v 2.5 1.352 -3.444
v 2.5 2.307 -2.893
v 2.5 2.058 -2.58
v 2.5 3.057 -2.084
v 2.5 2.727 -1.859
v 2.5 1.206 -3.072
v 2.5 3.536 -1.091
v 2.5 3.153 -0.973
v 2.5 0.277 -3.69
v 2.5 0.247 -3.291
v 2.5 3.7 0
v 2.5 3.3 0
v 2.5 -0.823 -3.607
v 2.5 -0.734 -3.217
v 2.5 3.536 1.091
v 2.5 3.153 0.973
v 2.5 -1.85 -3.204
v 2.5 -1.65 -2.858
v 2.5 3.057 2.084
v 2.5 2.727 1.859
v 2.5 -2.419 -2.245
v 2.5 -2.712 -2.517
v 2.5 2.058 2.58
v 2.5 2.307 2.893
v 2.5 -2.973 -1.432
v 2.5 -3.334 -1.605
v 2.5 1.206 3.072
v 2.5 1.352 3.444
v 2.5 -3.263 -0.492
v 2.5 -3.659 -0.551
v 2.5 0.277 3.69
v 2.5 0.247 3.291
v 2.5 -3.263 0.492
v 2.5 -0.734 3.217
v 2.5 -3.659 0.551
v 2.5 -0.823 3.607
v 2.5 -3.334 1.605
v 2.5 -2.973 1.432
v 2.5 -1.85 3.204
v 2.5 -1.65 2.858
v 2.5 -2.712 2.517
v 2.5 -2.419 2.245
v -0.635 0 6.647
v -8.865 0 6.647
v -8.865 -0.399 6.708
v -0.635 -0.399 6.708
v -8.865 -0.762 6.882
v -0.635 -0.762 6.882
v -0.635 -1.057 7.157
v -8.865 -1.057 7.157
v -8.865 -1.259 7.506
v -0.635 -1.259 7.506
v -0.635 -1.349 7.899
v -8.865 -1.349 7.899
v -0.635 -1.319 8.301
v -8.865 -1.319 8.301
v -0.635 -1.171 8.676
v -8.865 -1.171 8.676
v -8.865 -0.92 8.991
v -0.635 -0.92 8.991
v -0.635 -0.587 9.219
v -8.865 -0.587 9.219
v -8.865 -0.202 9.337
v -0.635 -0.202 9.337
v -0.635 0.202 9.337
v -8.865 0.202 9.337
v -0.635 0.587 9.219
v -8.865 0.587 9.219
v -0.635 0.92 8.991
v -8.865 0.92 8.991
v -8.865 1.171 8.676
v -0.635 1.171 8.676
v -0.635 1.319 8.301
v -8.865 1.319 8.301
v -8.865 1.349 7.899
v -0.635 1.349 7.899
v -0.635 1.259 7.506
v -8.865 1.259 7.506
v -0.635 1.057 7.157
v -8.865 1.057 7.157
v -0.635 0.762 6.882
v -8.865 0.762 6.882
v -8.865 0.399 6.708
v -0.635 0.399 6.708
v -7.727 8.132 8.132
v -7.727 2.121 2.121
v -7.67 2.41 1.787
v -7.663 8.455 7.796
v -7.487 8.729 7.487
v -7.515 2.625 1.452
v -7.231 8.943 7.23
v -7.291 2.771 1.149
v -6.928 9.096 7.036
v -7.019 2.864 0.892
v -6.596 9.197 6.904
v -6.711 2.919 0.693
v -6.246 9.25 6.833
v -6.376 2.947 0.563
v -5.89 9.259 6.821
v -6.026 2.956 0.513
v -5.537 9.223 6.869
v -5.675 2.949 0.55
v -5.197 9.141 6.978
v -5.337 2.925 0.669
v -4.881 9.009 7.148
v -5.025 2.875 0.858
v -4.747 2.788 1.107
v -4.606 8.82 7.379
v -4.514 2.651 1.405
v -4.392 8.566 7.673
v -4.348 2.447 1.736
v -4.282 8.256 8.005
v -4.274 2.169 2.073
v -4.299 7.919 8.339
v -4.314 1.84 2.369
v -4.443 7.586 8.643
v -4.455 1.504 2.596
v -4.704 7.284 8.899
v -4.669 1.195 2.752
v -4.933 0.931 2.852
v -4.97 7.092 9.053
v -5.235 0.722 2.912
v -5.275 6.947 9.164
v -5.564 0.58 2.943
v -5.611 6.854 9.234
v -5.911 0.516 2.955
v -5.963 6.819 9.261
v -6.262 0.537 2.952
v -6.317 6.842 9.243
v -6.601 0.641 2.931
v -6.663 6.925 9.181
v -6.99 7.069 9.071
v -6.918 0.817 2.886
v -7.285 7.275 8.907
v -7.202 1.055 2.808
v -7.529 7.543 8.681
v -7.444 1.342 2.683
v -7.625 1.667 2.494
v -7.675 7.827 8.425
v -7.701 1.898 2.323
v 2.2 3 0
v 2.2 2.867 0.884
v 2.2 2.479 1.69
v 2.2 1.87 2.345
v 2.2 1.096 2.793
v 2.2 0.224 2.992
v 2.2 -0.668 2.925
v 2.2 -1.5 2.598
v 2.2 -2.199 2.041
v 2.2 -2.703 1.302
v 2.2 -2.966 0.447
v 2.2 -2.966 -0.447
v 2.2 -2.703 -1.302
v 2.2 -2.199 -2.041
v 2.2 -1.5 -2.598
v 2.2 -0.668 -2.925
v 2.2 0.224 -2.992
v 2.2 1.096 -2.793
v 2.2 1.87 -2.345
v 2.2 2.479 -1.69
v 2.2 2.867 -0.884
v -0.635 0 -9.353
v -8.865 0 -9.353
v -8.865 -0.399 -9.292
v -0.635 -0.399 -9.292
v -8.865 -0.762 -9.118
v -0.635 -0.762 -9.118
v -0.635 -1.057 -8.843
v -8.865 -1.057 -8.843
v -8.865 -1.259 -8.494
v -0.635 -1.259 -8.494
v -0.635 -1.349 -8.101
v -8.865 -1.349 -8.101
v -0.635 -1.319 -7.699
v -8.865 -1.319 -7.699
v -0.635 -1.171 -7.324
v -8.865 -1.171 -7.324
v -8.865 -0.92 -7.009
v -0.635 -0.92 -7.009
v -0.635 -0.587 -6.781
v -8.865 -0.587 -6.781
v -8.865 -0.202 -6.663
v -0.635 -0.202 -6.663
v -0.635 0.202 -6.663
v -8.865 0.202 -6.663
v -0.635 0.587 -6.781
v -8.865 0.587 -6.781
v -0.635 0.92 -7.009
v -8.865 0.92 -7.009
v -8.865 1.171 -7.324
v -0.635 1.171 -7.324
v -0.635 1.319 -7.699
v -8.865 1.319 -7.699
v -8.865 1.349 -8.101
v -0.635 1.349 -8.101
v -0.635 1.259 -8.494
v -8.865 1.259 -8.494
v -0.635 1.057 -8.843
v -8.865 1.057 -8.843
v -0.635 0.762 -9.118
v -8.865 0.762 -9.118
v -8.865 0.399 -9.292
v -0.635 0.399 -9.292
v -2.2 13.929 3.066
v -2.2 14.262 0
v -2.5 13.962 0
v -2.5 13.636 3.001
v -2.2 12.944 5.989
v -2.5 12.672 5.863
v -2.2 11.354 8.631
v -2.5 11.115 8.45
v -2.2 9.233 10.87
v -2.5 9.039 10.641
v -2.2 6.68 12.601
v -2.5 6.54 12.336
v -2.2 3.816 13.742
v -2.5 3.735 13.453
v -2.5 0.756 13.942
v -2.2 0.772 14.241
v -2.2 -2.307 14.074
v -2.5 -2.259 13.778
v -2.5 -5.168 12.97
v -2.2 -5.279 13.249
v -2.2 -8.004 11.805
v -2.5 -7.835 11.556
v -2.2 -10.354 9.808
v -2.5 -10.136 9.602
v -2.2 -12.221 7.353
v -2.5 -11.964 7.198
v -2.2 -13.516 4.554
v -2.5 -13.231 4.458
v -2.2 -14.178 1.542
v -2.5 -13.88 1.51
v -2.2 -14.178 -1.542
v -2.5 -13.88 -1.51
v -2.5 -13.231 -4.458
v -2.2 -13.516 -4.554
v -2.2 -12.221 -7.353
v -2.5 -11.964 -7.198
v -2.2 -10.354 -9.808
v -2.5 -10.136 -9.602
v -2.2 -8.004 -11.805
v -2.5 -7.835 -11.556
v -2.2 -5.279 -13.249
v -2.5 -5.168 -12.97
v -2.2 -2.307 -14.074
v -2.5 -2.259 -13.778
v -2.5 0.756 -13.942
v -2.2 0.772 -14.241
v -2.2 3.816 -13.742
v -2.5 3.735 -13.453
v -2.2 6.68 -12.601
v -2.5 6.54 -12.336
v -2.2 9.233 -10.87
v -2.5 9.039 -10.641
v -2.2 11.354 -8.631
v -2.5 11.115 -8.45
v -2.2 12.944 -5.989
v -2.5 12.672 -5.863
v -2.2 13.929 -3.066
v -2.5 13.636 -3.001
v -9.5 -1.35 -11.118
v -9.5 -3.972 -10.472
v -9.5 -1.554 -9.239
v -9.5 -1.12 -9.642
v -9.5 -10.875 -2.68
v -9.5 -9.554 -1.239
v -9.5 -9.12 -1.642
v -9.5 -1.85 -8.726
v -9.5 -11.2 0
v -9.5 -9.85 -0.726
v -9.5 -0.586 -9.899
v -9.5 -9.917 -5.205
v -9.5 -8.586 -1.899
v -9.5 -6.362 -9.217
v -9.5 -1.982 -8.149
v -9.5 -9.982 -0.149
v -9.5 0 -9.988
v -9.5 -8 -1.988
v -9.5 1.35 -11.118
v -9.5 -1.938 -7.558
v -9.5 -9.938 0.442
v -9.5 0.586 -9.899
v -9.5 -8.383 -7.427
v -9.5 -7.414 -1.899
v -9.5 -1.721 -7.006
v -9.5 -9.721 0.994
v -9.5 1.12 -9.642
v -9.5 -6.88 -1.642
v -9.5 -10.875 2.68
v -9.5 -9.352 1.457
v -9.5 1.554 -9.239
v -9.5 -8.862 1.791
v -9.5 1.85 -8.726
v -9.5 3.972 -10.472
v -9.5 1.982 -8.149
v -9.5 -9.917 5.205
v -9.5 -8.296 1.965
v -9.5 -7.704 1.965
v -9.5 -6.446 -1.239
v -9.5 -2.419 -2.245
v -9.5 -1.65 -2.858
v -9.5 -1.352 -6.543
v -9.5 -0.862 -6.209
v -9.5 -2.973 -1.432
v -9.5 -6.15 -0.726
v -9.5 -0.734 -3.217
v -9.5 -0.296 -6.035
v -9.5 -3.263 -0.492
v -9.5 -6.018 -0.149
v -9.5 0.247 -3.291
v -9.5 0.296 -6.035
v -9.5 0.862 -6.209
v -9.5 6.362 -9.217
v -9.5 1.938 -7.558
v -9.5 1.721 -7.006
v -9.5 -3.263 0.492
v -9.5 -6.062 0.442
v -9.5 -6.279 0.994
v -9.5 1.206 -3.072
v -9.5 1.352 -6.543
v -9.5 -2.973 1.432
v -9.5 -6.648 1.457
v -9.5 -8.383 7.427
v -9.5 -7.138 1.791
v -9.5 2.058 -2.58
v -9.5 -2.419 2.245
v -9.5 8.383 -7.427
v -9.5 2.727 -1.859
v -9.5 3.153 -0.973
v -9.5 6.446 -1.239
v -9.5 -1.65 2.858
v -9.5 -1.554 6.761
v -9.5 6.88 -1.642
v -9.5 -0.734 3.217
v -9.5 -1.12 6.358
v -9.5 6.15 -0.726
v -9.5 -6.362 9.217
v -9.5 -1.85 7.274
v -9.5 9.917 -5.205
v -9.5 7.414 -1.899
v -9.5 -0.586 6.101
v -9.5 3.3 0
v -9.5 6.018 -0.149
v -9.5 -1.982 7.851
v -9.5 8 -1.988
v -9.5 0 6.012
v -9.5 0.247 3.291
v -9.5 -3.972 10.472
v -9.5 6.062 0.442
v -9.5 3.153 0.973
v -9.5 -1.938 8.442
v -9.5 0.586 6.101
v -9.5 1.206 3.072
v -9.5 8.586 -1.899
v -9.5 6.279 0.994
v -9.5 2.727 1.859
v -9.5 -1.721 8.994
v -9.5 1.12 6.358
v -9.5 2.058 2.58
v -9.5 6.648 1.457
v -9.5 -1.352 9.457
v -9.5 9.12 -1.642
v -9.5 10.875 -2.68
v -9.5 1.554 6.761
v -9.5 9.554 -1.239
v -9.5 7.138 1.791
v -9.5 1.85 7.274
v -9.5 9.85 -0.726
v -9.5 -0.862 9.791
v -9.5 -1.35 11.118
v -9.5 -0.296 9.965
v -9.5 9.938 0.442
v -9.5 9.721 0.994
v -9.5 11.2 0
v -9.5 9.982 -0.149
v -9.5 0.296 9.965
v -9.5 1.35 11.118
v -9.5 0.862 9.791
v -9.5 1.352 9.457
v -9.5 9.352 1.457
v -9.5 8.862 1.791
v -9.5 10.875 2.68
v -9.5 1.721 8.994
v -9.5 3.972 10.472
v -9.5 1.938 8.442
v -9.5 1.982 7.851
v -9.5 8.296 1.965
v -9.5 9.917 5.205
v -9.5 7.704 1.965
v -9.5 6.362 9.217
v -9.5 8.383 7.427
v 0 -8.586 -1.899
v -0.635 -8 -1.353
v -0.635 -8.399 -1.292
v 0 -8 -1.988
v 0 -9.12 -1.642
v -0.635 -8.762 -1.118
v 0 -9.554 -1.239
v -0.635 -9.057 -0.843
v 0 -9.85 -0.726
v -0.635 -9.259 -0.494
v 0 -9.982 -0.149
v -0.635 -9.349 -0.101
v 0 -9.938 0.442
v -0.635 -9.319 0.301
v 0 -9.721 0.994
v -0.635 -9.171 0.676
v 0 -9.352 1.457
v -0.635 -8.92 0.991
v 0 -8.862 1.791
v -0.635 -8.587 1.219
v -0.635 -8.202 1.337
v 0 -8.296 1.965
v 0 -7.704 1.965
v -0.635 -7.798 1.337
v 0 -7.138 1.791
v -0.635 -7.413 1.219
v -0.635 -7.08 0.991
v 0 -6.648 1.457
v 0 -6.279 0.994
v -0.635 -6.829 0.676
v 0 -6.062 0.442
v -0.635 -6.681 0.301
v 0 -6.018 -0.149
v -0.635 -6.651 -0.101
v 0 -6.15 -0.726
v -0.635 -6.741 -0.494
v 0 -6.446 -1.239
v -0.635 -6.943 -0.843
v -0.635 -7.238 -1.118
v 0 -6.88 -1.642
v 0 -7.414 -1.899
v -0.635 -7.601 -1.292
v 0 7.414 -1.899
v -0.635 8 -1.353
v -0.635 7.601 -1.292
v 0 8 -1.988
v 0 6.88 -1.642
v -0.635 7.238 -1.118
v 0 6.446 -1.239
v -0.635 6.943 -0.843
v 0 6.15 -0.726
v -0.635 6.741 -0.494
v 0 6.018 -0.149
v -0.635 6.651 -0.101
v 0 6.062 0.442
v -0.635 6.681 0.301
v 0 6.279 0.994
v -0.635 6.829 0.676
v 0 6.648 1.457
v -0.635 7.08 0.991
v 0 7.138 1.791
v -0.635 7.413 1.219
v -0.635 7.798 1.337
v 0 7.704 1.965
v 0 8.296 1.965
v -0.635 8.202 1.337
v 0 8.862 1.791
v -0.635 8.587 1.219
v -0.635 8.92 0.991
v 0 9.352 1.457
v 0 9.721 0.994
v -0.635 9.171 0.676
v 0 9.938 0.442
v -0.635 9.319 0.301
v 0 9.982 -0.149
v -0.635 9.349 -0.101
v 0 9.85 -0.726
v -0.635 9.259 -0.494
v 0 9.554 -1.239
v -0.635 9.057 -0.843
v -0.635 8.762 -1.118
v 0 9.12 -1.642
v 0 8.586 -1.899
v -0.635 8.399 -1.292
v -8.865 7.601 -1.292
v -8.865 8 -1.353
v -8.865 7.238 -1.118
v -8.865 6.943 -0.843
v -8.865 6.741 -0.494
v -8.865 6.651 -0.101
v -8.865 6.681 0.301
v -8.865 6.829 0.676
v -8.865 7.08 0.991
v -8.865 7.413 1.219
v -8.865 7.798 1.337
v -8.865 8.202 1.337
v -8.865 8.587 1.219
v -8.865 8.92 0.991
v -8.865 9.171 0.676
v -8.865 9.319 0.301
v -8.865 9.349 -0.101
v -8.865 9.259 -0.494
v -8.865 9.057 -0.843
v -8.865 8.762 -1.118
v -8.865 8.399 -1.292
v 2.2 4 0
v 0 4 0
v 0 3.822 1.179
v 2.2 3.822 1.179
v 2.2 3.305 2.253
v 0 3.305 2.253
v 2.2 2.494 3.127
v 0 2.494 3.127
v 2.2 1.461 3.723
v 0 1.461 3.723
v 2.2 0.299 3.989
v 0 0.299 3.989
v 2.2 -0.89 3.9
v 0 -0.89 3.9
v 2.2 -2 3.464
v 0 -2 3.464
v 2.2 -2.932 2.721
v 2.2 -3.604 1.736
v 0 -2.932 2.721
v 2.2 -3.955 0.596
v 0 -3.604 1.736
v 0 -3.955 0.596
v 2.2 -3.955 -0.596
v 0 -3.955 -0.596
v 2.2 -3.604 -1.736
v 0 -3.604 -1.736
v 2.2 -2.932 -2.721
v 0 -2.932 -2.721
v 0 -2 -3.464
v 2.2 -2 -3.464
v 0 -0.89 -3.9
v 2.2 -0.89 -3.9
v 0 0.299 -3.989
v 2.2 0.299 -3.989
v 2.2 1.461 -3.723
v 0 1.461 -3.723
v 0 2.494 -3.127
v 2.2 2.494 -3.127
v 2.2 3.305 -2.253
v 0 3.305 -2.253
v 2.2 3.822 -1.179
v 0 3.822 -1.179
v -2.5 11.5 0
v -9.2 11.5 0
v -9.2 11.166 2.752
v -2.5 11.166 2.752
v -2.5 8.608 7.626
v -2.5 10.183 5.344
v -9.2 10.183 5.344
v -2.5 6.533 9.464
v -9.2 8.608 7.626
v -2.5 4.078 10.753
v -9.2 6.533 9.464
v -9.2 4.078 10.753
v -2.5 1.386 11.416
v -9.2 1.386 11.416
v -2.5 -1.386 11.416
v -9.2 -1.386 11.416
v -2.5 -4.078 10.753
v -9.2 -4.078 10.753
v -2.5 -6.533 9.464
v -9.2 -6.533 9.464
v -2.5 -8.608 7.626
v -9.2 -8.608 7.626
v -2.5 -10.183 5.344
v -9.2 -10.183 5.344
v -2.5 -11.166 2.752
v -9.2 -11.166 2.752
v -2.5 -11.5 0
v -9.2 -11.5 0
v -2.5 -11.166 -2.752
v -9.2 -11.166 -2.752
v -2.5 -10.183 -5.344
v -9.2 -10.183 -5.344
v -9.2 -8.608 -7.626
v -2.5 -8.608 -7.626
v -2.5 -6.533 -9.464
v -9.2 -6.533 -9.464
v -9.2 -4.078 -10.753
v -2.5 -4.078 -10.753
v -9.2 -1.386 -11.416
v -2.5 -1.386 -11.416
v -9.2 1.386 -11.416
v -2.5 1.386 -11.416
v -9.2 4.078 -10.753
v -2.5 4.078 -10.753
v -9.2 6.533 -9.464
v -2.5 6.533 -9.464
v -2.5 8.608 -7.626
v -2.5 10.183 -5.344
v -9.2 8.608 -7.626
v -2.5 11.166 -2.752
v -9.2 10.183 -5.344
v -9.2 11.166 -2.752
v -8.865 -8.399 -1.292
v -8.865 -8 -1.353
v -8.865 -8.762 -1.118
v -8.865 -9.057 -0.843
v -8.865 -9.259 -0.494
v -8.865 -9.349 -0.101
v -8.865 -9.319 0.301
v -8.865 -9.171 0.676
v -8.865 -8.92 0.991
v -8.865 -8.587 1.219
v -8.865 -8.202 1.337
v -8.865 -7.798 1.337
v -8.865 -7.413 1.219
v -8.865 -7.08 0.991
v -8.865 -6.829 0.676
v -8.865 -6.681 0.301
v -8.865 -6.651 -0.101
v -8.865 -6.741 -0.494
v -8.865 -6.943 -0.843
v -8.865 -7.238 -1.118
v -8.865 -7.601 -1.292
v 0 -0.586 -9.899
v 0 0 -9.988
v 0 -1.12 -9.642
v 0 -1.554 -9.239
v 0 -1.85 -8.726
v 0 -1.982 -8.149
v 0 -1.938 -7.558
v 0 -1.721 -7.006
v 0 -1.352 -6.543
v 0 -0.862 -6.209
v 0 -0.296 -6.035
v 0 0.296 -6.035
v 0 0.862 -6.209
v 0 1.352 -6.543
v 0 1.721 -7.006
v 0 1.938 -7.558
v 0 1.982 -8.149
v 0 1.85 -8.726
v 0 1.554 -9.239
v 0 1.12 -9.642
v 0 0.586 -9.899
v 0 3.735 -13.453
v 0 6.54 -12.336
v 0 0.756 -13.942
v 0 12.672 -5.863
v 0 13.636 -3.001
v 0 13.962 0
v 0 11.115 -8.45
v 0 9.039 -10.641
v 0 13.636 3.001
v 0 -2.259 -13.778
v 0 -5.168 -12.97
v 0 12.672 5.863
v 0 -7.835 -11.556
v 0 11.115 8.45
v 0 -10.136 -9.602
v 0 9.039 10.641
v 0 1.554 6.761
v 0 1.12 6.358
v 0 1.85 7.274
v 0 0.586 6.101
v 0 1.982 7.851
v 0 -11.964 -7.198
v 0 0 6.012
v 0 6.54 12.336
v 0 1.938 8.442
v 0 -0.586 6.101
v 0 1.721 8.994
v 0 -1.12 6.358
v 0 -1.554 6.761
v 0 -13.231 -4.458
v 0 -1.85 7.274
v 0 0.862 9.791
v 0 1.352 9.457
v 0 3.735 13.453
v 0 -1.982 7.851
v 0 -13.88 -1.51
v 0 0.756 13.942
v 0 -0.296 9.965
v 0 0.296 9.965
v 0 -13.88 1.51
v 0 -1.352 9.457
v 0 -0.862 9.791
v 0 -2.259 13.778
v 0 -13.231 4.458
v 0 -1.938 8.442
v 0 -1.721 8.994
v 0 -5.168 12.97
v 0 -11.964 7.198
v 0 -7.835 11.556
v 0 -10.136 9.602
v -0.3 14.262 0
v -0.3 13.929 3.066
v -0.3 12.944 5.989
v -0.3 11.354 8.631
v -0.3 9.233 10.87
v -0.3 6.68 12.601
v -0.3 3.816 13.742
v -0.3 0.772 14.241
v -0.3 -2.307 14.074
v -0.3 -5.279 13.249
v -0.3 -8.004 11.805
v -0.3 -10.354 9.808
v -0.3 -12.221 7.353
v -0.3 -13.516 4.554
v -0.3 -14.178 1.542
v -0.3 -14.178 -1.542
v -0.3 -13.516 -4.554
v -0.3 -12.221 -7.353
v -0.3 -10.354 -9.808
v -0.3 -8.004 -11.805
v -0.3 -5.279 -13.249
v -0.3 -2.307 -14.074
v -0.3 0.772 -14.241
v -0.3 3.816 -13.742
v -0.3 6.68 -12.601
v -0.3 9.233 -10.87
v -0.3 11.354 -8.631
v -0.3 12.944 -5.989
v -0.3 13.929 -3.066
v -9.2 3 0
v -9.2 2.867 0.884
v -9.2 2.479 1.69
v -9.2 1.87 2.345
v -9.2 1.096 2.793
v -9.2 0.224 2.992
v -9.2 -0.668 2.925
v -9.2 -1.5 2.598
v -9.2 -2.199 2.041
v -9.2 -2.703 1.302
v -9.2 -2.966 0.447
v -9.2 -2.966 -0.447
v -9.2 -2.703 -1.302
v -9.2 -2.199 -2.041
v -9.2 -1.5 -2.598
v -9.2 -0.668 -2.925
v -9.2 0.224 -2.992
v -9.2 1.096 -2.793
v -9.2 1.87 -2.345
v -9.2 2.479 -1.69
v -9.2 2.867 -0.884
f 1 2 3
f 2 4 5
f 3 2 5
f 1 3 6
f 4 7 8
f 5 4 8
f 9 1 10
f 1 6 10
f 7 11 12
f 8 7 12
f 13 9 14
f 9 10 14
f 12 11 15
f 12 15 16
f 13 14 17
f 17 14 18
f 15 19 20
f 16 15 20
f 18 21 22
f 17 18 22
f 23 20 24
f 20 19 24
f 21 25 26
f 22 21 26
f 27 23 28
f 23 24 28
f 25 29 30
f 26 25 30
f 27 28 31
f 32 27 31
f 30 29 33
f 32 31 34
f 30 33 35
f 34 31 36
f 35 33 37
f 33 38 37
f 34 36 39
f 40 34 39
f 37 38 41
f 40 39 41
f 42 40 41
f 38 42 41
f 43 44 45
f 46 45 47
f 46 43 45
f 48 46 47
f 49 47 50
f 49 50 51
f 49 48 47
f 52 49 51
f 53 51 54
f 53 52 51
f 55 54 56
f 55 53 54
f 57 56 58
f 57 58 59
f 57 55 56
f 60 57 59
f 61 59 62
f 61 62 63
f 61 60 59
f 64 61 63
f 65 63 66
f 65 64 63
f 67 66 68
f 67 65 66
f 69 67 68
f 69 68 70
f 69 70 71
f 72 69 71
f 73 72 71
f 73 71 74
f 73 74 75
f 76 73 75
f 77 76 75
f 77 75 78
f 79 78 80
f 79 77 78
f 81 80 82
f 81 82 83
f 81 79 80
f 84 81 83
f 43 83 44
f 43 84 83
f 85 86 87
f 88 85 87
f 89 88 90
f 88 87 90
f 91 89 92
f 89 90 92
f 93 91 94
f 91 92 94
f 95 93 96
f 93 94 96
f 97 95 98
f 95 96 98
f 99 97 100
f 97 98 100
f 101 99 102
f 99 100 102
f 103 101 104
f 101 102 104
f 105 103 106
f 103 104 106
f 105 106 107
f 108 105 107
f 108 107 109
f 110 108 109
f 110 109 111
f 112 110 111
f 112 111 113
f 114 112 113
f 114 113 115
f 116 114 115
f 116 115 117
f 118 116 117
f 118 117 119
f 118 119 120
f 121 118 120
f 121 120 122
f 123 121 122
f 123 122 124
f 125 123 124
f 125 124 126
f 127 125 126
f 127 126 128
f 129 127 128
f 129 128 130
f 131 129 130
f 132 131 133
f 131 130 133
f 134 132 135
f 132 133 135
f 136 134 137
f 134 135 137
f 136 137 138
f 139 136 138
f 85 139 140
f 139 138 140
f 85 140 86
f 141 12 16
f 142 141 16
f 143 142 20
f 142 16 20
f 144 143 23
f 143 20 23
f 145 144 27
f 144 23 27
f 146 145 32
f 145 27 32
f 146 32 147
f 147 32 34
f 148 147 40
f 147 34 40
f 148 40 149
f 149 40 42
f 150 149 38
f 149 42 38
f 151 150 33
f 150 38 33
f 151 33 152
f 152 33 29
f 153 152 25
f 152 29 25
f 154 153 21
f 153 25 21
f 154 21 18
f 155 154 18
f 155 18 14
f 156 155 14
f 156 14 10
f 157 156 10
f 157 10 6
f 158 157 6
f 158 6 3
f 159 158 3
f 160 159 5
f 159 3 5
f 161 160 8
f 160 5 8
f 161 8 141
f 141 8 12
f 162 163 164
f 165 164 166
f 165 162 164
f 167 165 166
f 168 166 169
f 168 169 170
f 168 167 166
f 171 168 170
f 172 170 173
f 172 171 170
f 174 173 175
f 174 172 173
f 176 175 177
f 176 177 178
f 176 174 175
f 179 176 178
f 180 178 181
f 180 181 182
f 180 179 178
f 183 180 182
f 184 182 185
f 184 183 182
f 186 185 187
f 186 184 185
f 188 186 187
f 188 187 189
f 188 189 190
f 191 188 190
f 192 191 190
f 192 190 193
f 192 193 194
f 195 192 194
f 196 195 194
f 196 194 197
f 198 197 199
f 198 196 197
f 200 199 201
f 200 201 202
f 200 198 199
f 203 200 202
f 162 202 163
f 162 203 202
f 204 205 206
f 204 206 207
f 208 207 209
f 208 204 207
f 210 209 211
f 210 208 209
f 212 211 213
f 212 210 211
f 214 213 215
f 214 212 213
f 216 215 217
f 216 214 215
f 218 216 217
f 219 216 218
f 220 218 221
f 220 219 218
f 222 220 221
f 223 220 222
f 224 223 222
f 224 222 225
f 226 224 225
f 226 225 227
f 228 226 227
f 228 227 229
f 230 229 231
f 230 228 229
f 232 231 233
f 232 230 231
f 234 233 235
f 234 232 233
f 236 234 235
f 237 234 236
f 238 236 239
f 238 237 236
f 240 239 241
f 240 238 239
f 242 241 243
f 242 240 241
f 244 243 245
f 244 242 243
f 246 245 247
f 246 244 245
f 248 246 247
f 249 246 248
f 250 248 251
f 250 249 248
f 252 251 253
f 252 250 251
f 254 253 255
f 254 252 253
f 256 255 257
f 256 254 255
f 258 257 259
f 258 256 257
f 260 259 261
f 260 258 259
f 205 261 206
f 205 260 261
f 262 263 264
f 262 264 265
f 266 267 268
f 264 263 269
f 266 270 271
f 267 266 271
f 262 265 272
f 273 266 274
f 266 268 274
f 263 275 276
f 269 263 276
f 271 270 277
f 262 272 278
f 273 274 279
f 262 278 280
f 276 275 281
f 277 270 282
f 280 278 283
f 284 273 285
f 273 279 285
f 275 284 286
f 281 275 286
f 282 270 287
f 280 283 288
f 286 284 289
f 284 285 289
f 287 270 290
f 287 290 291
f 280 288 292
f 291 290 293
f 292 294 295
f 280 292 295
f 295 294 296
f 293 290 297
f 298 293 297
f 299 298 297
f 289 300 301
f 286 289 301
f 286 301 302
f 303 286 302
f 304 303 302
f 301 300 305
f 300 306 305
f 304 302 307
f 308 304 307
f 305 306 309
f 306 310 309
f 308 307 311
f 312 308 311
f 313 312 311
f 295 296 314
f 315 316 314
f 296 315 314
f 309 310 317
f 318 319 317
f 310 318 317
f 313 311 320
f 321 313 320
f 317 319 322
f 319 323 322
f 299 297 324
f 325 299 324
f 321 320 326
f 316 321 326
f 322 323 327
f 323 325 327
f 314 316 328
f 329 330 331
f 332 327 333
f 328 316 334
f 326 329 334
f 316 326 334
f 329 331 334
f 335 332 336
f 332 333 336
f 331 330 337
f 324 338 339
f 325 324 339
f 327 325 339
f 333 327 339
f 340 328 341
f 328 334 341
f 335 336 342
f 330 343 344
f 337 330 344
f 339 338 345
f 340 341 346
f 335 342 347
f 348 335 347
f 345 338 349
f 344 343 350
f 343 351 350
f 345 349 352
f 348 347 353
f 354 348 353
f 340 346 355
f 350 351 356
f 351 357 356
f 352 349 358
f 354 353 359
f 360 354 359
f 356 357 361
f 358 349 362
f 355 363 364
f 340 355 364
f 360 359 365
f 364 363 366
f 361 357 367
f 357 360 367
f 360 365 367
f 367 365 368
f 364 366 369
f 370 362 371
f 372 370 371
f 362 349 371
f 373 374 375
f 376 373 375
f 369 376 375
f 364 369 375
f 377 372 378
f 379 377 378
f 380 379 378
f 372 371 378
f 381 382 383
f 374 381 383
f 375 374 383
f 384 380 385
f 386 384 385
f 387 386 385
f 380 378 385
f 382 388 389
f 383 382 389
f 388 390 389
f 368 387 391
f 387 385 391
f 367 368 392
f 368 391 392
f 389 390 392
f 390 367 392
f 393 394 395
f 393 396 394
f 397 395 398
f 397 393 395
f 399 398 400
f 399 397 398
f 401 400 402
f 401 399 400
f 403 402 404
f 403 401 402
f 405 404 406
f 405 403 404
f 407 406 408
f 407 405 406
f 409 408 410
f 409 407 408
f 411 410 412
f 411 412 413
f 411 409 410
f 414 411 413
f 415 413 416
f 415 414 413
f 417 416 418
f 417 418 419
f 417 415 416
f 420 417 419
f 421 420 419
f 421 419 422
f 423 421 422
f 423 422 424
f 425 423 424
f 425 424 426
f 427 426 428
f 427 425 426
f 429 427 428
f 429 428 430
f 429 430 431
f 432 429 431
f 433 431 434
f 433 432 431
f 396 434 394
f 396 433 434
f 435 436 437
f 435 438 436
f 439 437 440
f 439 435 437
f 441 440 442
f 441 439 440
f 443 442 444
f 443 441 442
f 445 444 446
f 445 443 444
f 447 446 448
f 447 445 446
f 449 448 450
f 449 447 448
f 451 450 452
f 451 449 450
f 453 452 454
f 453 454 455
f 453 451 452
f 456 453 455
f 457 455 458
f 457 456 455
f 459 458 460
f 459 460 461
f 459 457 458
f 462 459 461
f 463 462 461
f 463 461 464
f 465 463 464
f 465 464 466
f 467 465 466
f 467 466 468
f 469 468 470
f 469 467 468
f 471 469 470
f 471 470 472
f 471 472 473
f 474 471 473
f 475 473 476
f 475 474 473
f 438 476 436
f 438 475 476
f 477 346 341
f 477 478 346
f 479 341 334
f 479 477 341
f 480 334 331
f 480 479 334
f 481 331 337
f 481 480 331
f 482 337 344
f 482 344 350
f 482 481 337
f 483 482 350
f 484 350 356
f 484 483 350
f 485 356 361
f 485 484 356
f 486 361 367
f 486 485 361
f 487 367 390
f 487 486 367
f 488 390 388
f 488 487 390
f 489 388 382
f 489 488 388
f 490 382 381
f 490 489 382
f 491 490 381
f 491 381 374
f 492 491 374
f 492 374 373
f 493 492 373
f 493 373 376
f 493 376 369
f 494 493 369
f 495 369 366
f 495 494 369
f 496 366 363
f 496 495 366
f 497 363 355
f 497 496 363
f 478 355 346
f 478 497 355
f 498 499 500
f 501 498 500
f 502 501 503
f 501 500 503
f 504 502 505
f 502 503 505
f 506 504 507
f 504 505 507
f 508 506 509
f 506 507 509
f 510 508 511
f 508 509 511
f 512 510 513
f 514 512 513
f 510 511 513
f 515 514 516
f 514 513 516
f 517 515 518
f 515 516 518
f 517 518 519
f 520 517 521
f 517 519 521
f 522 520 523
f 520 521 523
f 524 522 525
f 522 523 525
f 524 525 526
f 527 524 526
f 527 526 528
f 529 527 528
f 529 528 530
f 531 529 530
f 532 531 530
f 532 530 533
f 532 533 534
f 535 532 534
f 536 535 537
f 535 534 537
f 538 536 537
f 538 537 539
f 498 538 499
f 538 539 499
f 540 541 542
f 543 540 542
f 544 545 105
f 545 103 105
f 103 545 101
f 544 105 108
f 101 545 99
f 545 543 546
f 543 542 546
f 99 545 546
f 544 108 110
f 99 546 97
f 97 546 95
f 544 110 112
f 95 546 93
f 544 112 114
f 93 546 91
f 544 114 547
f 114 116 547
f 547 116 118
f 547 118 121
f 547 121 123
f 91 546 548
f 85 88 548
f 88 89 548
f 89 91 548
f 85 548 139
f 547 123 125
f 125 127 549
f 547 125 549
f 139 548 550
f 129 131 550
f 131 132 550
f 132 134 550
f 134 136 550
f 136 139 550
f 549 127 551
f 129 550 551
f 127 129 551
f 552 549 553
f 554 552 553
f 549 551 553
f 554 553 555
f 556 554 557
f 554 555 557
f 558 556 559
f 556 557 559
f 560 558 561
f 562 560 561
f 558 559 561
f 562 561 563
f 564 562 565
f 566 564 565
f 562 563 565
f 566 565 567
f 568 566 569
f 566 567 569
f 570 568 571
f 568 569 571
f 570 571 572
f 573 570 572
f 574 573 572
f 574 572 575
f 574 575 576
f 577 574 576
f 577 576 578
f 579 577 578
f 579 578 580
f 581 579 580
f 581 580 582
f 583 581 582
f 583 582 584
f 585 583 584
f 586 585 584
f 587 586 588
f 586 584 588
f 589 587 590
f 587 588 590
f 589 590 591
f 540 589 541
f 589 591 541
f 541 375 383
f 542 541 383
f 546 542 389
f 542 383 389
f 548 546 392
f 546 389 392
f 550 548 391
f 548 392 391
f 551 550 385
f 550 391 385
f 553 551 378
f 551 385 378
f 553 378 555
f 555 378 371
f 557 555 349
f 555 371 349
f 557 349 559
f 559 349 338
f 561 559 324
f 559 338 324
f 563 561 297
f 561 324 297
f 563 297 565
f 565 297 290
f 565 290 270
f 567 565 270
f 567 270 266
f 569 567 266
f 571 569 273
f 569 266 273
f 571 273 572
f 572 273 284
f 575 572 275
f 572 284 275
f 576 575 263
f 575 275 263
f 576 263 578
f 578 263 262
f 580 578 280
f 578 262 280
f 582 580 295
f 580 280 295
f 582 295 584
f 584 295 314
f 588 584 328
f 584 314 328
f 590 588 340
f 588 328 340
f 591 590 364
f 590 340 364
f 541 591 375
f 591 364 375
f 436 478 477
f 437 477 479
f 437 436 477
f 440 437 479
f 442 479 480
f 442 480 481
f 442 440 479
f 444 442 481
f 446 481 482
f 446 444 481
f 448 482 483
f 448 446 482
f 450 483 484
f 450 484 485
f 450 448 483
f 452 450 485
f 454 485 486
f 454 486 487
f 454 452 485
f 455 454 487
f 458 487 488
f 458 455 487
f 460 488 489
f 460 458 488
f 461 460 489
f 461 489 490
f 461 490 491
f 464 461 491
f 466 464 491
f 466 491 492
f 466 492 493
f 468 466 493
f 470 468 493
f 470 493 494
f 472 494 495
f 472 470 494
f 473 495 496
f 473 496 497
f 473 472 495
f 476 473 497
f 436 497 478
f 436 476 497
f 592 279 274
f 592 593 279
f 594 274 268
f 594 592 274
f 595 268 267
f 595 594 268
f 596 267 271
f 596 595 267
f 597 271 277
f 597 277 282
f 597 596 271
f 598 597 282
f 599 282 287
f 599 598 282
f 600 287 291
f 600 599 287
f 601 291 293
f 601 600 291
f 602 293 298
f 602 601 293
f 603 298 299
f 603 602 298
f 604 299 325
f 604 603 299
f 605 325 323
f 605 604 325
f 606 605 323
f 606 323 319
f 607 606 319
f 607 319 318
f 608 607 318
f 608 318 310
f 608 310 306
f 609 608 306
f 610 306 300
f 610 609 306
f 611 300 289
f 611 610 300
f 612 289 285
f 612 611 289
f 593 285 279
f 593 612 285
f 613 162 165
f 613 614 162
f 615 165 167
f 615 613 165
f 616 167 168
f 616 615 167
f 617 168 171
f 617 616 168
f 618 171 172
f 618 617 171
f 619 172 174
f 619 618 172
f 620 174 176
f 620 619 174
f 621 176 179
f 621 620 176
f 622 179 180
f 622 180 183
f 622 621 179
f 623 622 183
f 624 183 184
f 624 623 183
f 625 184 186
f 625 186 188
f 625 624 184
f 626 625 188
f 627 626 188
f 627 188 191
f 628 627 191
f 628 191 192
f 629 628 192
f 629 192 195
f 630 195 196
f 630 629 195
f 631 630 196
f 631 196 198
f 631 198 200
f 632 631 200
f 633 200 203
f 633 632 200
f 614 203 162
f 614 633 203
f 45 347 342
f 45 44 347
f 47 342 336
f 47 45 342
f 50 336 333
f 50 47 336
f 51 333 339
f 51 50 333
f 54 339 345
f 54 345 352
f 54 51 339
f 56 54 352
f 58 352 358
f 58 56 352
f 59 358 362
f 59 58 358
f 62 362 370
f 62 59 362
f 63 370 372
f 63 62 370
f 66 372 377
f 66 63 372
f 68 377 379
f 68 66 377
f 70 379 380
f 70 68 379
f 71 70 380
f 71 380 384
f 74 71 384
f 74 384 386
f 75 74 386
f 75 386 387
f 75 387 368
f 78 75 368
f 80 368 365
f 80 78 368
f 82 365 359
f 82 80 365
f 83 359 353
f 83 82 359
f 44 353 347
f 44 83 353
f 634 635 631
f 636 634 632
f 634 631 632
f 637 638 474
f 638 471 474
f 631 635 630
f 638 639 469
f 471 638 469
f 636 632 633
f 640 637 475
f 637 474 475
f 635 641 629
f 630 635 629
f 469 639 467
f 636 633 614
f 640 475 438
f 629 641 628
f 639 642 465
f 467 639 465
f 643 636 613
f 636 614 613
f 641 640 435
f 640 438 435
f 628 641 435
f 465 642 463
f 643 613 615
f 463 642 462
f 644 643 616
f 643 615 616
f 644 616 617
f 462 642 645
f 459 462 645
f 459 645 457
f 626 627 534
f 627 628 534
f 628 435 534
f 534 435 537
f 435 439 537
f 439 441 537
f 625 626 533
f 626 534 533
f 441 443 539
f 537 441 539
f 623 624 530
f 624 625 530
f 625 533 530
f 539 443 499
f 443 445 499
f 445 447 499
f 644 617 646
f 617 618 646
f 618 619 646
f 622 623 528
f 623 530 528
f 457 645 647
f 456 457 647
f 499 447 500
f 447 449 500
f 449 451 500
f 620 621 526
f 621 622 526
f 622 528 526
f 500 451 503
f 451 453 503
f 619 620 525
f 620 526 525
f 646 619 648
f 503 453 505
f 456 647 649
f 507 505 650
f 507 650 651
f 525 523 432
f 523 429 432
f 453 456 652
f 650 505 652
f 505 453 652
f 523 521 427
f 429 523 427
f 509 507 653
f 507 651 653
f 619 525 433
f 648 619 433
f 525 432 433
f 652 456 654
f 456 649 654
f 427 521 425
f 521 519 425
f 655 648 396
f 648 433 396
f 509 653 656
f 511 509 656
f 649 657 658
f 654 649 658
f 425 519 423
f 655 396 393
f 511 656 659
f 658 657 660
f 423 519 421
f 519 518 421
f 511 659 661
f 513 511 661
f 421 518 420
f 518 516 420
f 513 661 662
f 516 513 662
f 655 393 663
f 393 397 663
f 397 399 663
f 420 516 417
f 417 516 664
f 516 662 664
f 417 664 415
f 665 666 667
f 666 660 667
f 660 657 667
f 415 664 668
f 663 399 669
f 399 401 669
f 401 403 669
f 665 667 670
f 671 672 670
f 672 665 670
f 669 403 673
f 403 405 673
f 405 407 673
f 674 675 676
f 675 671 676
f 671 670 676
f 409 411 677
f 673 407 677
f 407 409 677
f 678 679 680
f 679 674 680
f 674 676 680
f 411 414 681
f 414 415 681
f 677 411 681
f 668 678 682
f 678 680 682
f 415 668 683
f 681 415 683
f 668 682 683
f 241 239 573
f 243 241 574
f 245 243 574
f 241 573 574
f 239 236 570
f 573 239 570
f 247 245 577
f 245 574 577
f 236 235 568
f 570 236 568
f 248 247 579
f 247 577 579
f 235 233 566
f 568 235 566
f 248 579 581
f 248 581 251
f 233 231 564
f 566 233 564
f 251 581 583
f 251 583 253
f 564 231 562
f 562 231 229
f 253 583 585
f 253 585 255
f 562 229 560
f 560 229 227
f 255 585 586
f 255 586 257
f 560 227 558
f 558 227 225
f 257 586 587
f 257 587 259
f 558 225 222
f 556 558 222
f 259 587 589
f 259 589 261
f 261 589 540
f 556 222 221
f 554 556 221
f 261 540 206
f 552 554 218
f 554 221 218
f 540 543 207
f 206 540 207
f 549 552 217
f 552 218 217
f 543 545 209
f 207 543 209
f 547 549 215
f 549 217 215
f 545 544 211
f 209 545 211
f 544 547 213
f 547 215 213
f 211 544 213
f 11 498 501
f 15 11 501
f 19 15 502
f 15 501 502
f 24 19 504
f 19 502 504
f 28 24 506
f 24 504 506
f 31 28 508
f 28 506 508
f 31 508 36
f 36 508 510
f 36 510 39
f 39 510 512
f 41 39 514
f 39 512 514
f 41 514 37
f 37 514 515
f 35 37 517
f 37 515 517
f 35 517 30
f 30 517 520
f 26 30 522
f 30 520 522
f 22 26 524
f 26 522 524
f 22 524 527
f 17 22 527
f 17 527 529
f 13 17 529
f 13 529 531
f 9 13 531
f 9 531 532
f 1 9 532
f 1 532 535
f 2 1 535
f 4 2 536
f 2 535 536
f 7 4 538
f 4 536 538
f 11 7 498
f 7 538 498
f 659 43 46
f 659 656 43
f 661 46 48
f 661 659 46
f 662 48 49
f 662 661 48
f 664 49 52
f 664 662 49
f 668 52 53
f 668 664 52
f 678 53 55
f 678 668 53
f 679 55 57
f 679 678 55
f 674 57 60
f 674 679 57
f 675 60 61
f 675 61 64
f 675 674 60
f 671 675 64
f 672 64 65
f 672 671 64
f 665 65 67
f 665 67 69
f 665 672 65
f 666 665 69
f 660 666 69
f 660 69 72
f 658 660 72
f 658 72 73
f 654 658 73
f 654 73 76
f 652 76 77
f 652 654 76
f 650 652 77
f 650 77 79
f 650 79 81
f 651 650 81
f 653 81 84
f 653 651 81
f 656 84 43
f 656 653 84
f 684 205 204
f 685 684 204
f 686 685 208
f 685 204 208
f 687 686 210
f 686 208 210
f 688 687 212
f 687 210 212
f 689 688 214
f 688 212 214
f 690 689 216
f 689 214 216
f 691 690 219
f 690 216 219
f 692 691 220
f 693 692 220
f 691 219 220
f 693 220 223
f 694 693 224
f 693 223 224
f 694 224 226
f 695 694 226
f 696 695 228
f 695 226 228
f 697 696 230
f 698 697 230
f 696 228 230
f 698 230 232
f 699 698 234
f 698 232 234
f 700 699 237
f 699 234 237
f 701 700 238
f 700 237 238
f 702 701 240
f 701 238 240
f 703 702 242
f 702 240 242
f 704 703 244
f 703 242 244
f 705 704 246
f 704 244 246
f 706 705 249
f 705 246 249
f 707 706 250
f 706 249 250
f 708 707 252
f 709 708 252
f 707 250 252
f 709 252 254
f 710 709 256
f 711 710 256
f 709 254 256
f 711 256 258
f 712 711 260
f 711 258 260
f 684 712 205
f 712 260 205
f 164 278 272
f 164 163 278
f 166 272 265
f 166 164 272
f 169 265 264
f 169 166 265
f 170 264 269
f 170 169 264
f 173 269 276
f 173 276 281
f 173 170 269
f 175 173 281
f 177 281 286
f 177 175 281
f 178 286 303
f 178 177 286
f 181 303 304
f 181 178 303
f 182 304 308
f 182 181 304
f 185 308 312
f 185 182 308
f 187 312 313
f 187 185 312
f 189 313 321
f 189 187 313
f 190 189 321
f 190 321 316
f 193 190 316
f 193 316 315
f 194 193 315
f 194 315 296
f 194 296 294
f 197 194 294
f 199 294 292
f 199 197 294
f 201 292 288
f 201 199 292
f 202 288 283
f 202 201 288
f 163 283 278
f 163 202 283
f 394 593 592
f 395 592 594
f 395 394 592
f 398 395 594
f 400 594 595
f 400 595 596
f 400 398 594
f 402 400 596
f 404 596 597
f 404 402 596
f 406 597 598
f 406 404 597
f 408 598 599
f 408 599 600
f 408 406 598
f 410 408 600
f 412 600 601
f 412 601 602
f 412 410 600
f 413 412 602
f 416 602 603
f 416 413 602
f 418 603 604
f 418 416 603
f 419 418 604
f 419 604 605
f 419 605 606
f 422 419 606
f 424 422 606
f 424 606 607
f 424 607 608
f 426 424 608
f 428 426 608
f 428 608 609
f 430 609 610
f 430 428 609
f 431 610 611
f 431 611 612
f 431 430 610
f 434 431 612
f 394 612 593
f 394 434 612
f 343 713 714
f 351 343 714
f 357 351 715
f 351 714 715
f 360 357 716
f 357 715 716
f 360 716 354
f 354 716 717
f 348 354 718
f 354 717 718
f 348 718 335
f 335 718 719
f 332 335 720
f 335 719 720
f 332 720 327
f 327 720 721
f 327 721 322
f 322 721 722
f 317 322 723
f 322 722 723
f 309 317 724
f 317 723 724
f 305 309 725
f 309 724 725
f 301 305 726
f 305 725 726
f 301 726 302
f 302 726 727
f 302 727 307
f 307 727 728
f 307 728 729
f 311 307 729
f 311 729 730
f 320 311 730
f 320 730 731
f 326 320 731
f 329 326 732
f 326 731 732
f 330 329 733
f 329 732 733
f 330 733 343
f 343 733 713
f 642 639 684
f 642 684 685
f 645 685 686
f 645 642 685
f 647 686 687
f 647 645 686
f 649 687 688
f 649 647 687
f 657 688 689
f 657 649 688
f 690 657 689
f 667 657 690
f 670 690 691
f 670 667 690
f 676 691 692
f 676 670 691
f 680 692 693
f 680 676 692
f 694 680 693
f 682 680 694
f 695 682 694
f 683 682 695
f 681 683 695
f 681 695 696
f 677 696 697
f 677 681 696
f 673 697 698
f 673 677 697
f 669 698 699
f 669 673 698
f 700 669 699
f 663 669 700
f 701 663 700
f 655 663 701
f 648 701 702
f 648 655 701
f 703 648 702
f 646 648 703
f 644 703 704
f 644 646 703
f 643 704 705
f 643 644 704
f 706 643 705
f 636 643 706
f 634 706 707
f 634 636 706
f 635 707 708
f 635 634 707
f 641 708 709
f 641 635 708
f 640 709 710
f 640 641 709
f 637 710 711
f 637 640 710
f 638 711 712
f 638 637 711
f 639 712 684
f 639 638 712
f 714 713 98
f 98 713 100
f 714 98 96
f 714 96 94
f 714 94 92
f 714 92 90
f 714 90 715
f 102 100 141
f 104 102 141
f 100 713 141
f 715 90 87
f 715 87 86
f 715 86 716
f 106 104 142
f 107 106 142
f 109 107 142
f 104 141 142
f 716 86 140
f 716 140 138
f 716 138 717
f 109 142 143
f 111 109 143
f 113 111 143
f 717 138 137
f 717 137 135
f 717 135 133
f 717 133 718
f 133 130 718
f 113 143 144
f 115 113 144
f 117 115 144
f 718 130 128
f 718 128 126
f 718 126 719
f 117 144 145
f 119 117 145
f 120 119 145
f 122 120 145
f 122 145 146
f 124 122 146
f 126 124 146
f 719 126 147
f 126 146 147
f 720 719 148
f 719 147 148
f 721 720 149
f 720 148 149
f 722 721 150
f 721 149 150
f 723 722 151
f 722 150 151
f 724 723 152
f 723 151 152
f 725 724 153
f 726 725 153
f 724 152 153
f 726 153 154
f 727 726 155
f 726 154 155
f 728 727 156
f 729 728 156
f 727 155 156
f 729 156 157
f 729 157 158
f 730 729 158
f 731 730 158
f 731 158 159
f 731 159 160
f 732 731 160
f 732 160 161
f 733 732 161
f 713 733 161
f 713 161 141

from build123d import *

# Parameters (mm, degrees)
F_6_32_TAPPED_HOLE1_AT_2_COUNT = 2
F_6_32_TAPPED_HOLE1_AT_2_PITCH = 11.313708499
F_6_32_TAPPED_HOLE1_AT_3_COUNT = 2
F_6_32_TAPPED_HOLE1_AT_3_PITCH = 11.313708499
F_6_32_TAPPED_HOLE1_AT_4_COUNT = 2
F_6_32_TAPPED_HOLE1_AT_4_PITCH = 16
BOSS_EXTRUDE1_START            = 10
SKETCH4_R                      = 1.25
BOSS_EXTRUDE1_DEPTH            = 1.5
F_8_32_TAPPED_HOLE1_D          = 3.4544
F_8_32_TAPPED_HOLE1_DEPTH      = 10.708
F_8_32_TAPPED_HOLE1_TIP        = 1.037806461
CHAMFER1_SIZE                  = 0.3


with BuildPart() as part:
    # Sketch1 → Revolve1 (revolve)
    with BuildSketch(Plane.XY):
        Polygon((-9.5, 3), (2.5, 3), (2.5, 4), (0, 4), (0, 14.2621), (-2.5, 14.2621), (-2.5, 11.5), (-9.5, 11.5), align=None)
    revolve(axis=Axis((0, 0, 0), (1, 0, 0)))

    # Sketch3 → #6-32 Tapped Hole1 (revolve, cut)
    with BuildSketch(Plane(origin=(0, 0, 8), x_dir=(0, 0, -1), z_dir=(0, 1, 0))):
        Polygon((0, 0), (0, 9.5), (1.98755, 9.5), (1.35255, 8.865), (1.35255, 0.635), (1.98755, 0), align=None)
    f_6_32_tapped_hole1 = revolve(axis=Axis((6.35, 0, 8), (-1, 0, 0)), mode=Mode.SUBTRACT)

    # #6-32 Tapped Hole1 at 2: #6-32 Tapped Hole1 ×2
    with Locations(*[Vector(0, 0.7071067811865476, -0.7071067811865476) * (i * F_6_32_TAPPED_HOLE1_AT_2_PITCH) for i in range(1, F_6_32_TAPPED_HOLE1_AT_2_COUNT)]):
        add(f_6_32_tapped_hole1, mode=Mode.SUBTRACT)

    # #6-32 Tapped Hole1 at 3: #6-32 Tapped Hole1 ×2
    with Locations(*[Vector(0, -0.7071067811865476, -0.7071067811865476) * (i * F_6_32_TAPPED_HOLE1_AT_3_PITCH) for i in range(1, F_6_32_TAPPED_HOLE1_AT_3_COUNT)]):
        add(f_6_32_tapped_hole1, mode=Mode.SUBTRACT)

    # #6-32 Tapped Hole1 at 4: #6-32 Tapped Hole1 ×2
    with Locations(*[(0, 0, -i * F_6_32_TAPPED_HOLE1_AT_4_PITCH) for i in range(1, F_6_32_TAPPED_HOLE1_AT_4_COUNT)]):
        add(f_6_32_tapped_hole1, mode=Mode.SUBTRACT)

    # Sketch4 → Boss-Extrude1 (add)
    with BuildSketch(Plane(origin=(0, 0, 0), x_dir=(-1, 0, 0), z_dir=(0, 0.7071067811865464, 0.7071067811865488)).offset(BOSS_EXTRUDE1_START)):
        with Locations((6, 0)):
            Circle(SKETCH4_R)
    extrude(amount=BOSS_EXTRUDE1_DEPTH)

    # #8-32 Tapped Hole1
    with Locations(Plane(origin=(0, 8.131727984, 8.131727984), x_dir=(1, 0, 0), z_dir=(0, 0.7071067811865465, 0.7071067811865487))):
        with Locations((-6, 0)):
            Hole(F_8_32_TAPPED_HOLE1_D / 2, depth=F_8_32_TAPPED_HOLE1_DEPTH)
            with Locations((0, 0, -(F_8_32_TAPPED_HOLE1_DEPTH + F_8_32_TAPPED_HOLE1_TIP / 2))):  # 118° drill point
                Cone(0, F_8_32_TAPPED_HOLE1_D / 2, F_8_32_TAPPED_HOLE1_TIP, mode=Mode.SUBTRACT)

    # Chamfer1
    chamfer1_edges = [part.edges().sort_by_distance(p)[0] for p in [
        (-9.5, -11.5, 0),
        (-2.5, -14.2621, 0),
        (0, -14.2621, 0),
        (2.5, -3, 0),
        (2.5, -4, 0),
        (-9.5, -3, 0),
    ]]
    chamfer(chamfer1_edges, length=CHAMFER1_SIZE)


solid = part.part
